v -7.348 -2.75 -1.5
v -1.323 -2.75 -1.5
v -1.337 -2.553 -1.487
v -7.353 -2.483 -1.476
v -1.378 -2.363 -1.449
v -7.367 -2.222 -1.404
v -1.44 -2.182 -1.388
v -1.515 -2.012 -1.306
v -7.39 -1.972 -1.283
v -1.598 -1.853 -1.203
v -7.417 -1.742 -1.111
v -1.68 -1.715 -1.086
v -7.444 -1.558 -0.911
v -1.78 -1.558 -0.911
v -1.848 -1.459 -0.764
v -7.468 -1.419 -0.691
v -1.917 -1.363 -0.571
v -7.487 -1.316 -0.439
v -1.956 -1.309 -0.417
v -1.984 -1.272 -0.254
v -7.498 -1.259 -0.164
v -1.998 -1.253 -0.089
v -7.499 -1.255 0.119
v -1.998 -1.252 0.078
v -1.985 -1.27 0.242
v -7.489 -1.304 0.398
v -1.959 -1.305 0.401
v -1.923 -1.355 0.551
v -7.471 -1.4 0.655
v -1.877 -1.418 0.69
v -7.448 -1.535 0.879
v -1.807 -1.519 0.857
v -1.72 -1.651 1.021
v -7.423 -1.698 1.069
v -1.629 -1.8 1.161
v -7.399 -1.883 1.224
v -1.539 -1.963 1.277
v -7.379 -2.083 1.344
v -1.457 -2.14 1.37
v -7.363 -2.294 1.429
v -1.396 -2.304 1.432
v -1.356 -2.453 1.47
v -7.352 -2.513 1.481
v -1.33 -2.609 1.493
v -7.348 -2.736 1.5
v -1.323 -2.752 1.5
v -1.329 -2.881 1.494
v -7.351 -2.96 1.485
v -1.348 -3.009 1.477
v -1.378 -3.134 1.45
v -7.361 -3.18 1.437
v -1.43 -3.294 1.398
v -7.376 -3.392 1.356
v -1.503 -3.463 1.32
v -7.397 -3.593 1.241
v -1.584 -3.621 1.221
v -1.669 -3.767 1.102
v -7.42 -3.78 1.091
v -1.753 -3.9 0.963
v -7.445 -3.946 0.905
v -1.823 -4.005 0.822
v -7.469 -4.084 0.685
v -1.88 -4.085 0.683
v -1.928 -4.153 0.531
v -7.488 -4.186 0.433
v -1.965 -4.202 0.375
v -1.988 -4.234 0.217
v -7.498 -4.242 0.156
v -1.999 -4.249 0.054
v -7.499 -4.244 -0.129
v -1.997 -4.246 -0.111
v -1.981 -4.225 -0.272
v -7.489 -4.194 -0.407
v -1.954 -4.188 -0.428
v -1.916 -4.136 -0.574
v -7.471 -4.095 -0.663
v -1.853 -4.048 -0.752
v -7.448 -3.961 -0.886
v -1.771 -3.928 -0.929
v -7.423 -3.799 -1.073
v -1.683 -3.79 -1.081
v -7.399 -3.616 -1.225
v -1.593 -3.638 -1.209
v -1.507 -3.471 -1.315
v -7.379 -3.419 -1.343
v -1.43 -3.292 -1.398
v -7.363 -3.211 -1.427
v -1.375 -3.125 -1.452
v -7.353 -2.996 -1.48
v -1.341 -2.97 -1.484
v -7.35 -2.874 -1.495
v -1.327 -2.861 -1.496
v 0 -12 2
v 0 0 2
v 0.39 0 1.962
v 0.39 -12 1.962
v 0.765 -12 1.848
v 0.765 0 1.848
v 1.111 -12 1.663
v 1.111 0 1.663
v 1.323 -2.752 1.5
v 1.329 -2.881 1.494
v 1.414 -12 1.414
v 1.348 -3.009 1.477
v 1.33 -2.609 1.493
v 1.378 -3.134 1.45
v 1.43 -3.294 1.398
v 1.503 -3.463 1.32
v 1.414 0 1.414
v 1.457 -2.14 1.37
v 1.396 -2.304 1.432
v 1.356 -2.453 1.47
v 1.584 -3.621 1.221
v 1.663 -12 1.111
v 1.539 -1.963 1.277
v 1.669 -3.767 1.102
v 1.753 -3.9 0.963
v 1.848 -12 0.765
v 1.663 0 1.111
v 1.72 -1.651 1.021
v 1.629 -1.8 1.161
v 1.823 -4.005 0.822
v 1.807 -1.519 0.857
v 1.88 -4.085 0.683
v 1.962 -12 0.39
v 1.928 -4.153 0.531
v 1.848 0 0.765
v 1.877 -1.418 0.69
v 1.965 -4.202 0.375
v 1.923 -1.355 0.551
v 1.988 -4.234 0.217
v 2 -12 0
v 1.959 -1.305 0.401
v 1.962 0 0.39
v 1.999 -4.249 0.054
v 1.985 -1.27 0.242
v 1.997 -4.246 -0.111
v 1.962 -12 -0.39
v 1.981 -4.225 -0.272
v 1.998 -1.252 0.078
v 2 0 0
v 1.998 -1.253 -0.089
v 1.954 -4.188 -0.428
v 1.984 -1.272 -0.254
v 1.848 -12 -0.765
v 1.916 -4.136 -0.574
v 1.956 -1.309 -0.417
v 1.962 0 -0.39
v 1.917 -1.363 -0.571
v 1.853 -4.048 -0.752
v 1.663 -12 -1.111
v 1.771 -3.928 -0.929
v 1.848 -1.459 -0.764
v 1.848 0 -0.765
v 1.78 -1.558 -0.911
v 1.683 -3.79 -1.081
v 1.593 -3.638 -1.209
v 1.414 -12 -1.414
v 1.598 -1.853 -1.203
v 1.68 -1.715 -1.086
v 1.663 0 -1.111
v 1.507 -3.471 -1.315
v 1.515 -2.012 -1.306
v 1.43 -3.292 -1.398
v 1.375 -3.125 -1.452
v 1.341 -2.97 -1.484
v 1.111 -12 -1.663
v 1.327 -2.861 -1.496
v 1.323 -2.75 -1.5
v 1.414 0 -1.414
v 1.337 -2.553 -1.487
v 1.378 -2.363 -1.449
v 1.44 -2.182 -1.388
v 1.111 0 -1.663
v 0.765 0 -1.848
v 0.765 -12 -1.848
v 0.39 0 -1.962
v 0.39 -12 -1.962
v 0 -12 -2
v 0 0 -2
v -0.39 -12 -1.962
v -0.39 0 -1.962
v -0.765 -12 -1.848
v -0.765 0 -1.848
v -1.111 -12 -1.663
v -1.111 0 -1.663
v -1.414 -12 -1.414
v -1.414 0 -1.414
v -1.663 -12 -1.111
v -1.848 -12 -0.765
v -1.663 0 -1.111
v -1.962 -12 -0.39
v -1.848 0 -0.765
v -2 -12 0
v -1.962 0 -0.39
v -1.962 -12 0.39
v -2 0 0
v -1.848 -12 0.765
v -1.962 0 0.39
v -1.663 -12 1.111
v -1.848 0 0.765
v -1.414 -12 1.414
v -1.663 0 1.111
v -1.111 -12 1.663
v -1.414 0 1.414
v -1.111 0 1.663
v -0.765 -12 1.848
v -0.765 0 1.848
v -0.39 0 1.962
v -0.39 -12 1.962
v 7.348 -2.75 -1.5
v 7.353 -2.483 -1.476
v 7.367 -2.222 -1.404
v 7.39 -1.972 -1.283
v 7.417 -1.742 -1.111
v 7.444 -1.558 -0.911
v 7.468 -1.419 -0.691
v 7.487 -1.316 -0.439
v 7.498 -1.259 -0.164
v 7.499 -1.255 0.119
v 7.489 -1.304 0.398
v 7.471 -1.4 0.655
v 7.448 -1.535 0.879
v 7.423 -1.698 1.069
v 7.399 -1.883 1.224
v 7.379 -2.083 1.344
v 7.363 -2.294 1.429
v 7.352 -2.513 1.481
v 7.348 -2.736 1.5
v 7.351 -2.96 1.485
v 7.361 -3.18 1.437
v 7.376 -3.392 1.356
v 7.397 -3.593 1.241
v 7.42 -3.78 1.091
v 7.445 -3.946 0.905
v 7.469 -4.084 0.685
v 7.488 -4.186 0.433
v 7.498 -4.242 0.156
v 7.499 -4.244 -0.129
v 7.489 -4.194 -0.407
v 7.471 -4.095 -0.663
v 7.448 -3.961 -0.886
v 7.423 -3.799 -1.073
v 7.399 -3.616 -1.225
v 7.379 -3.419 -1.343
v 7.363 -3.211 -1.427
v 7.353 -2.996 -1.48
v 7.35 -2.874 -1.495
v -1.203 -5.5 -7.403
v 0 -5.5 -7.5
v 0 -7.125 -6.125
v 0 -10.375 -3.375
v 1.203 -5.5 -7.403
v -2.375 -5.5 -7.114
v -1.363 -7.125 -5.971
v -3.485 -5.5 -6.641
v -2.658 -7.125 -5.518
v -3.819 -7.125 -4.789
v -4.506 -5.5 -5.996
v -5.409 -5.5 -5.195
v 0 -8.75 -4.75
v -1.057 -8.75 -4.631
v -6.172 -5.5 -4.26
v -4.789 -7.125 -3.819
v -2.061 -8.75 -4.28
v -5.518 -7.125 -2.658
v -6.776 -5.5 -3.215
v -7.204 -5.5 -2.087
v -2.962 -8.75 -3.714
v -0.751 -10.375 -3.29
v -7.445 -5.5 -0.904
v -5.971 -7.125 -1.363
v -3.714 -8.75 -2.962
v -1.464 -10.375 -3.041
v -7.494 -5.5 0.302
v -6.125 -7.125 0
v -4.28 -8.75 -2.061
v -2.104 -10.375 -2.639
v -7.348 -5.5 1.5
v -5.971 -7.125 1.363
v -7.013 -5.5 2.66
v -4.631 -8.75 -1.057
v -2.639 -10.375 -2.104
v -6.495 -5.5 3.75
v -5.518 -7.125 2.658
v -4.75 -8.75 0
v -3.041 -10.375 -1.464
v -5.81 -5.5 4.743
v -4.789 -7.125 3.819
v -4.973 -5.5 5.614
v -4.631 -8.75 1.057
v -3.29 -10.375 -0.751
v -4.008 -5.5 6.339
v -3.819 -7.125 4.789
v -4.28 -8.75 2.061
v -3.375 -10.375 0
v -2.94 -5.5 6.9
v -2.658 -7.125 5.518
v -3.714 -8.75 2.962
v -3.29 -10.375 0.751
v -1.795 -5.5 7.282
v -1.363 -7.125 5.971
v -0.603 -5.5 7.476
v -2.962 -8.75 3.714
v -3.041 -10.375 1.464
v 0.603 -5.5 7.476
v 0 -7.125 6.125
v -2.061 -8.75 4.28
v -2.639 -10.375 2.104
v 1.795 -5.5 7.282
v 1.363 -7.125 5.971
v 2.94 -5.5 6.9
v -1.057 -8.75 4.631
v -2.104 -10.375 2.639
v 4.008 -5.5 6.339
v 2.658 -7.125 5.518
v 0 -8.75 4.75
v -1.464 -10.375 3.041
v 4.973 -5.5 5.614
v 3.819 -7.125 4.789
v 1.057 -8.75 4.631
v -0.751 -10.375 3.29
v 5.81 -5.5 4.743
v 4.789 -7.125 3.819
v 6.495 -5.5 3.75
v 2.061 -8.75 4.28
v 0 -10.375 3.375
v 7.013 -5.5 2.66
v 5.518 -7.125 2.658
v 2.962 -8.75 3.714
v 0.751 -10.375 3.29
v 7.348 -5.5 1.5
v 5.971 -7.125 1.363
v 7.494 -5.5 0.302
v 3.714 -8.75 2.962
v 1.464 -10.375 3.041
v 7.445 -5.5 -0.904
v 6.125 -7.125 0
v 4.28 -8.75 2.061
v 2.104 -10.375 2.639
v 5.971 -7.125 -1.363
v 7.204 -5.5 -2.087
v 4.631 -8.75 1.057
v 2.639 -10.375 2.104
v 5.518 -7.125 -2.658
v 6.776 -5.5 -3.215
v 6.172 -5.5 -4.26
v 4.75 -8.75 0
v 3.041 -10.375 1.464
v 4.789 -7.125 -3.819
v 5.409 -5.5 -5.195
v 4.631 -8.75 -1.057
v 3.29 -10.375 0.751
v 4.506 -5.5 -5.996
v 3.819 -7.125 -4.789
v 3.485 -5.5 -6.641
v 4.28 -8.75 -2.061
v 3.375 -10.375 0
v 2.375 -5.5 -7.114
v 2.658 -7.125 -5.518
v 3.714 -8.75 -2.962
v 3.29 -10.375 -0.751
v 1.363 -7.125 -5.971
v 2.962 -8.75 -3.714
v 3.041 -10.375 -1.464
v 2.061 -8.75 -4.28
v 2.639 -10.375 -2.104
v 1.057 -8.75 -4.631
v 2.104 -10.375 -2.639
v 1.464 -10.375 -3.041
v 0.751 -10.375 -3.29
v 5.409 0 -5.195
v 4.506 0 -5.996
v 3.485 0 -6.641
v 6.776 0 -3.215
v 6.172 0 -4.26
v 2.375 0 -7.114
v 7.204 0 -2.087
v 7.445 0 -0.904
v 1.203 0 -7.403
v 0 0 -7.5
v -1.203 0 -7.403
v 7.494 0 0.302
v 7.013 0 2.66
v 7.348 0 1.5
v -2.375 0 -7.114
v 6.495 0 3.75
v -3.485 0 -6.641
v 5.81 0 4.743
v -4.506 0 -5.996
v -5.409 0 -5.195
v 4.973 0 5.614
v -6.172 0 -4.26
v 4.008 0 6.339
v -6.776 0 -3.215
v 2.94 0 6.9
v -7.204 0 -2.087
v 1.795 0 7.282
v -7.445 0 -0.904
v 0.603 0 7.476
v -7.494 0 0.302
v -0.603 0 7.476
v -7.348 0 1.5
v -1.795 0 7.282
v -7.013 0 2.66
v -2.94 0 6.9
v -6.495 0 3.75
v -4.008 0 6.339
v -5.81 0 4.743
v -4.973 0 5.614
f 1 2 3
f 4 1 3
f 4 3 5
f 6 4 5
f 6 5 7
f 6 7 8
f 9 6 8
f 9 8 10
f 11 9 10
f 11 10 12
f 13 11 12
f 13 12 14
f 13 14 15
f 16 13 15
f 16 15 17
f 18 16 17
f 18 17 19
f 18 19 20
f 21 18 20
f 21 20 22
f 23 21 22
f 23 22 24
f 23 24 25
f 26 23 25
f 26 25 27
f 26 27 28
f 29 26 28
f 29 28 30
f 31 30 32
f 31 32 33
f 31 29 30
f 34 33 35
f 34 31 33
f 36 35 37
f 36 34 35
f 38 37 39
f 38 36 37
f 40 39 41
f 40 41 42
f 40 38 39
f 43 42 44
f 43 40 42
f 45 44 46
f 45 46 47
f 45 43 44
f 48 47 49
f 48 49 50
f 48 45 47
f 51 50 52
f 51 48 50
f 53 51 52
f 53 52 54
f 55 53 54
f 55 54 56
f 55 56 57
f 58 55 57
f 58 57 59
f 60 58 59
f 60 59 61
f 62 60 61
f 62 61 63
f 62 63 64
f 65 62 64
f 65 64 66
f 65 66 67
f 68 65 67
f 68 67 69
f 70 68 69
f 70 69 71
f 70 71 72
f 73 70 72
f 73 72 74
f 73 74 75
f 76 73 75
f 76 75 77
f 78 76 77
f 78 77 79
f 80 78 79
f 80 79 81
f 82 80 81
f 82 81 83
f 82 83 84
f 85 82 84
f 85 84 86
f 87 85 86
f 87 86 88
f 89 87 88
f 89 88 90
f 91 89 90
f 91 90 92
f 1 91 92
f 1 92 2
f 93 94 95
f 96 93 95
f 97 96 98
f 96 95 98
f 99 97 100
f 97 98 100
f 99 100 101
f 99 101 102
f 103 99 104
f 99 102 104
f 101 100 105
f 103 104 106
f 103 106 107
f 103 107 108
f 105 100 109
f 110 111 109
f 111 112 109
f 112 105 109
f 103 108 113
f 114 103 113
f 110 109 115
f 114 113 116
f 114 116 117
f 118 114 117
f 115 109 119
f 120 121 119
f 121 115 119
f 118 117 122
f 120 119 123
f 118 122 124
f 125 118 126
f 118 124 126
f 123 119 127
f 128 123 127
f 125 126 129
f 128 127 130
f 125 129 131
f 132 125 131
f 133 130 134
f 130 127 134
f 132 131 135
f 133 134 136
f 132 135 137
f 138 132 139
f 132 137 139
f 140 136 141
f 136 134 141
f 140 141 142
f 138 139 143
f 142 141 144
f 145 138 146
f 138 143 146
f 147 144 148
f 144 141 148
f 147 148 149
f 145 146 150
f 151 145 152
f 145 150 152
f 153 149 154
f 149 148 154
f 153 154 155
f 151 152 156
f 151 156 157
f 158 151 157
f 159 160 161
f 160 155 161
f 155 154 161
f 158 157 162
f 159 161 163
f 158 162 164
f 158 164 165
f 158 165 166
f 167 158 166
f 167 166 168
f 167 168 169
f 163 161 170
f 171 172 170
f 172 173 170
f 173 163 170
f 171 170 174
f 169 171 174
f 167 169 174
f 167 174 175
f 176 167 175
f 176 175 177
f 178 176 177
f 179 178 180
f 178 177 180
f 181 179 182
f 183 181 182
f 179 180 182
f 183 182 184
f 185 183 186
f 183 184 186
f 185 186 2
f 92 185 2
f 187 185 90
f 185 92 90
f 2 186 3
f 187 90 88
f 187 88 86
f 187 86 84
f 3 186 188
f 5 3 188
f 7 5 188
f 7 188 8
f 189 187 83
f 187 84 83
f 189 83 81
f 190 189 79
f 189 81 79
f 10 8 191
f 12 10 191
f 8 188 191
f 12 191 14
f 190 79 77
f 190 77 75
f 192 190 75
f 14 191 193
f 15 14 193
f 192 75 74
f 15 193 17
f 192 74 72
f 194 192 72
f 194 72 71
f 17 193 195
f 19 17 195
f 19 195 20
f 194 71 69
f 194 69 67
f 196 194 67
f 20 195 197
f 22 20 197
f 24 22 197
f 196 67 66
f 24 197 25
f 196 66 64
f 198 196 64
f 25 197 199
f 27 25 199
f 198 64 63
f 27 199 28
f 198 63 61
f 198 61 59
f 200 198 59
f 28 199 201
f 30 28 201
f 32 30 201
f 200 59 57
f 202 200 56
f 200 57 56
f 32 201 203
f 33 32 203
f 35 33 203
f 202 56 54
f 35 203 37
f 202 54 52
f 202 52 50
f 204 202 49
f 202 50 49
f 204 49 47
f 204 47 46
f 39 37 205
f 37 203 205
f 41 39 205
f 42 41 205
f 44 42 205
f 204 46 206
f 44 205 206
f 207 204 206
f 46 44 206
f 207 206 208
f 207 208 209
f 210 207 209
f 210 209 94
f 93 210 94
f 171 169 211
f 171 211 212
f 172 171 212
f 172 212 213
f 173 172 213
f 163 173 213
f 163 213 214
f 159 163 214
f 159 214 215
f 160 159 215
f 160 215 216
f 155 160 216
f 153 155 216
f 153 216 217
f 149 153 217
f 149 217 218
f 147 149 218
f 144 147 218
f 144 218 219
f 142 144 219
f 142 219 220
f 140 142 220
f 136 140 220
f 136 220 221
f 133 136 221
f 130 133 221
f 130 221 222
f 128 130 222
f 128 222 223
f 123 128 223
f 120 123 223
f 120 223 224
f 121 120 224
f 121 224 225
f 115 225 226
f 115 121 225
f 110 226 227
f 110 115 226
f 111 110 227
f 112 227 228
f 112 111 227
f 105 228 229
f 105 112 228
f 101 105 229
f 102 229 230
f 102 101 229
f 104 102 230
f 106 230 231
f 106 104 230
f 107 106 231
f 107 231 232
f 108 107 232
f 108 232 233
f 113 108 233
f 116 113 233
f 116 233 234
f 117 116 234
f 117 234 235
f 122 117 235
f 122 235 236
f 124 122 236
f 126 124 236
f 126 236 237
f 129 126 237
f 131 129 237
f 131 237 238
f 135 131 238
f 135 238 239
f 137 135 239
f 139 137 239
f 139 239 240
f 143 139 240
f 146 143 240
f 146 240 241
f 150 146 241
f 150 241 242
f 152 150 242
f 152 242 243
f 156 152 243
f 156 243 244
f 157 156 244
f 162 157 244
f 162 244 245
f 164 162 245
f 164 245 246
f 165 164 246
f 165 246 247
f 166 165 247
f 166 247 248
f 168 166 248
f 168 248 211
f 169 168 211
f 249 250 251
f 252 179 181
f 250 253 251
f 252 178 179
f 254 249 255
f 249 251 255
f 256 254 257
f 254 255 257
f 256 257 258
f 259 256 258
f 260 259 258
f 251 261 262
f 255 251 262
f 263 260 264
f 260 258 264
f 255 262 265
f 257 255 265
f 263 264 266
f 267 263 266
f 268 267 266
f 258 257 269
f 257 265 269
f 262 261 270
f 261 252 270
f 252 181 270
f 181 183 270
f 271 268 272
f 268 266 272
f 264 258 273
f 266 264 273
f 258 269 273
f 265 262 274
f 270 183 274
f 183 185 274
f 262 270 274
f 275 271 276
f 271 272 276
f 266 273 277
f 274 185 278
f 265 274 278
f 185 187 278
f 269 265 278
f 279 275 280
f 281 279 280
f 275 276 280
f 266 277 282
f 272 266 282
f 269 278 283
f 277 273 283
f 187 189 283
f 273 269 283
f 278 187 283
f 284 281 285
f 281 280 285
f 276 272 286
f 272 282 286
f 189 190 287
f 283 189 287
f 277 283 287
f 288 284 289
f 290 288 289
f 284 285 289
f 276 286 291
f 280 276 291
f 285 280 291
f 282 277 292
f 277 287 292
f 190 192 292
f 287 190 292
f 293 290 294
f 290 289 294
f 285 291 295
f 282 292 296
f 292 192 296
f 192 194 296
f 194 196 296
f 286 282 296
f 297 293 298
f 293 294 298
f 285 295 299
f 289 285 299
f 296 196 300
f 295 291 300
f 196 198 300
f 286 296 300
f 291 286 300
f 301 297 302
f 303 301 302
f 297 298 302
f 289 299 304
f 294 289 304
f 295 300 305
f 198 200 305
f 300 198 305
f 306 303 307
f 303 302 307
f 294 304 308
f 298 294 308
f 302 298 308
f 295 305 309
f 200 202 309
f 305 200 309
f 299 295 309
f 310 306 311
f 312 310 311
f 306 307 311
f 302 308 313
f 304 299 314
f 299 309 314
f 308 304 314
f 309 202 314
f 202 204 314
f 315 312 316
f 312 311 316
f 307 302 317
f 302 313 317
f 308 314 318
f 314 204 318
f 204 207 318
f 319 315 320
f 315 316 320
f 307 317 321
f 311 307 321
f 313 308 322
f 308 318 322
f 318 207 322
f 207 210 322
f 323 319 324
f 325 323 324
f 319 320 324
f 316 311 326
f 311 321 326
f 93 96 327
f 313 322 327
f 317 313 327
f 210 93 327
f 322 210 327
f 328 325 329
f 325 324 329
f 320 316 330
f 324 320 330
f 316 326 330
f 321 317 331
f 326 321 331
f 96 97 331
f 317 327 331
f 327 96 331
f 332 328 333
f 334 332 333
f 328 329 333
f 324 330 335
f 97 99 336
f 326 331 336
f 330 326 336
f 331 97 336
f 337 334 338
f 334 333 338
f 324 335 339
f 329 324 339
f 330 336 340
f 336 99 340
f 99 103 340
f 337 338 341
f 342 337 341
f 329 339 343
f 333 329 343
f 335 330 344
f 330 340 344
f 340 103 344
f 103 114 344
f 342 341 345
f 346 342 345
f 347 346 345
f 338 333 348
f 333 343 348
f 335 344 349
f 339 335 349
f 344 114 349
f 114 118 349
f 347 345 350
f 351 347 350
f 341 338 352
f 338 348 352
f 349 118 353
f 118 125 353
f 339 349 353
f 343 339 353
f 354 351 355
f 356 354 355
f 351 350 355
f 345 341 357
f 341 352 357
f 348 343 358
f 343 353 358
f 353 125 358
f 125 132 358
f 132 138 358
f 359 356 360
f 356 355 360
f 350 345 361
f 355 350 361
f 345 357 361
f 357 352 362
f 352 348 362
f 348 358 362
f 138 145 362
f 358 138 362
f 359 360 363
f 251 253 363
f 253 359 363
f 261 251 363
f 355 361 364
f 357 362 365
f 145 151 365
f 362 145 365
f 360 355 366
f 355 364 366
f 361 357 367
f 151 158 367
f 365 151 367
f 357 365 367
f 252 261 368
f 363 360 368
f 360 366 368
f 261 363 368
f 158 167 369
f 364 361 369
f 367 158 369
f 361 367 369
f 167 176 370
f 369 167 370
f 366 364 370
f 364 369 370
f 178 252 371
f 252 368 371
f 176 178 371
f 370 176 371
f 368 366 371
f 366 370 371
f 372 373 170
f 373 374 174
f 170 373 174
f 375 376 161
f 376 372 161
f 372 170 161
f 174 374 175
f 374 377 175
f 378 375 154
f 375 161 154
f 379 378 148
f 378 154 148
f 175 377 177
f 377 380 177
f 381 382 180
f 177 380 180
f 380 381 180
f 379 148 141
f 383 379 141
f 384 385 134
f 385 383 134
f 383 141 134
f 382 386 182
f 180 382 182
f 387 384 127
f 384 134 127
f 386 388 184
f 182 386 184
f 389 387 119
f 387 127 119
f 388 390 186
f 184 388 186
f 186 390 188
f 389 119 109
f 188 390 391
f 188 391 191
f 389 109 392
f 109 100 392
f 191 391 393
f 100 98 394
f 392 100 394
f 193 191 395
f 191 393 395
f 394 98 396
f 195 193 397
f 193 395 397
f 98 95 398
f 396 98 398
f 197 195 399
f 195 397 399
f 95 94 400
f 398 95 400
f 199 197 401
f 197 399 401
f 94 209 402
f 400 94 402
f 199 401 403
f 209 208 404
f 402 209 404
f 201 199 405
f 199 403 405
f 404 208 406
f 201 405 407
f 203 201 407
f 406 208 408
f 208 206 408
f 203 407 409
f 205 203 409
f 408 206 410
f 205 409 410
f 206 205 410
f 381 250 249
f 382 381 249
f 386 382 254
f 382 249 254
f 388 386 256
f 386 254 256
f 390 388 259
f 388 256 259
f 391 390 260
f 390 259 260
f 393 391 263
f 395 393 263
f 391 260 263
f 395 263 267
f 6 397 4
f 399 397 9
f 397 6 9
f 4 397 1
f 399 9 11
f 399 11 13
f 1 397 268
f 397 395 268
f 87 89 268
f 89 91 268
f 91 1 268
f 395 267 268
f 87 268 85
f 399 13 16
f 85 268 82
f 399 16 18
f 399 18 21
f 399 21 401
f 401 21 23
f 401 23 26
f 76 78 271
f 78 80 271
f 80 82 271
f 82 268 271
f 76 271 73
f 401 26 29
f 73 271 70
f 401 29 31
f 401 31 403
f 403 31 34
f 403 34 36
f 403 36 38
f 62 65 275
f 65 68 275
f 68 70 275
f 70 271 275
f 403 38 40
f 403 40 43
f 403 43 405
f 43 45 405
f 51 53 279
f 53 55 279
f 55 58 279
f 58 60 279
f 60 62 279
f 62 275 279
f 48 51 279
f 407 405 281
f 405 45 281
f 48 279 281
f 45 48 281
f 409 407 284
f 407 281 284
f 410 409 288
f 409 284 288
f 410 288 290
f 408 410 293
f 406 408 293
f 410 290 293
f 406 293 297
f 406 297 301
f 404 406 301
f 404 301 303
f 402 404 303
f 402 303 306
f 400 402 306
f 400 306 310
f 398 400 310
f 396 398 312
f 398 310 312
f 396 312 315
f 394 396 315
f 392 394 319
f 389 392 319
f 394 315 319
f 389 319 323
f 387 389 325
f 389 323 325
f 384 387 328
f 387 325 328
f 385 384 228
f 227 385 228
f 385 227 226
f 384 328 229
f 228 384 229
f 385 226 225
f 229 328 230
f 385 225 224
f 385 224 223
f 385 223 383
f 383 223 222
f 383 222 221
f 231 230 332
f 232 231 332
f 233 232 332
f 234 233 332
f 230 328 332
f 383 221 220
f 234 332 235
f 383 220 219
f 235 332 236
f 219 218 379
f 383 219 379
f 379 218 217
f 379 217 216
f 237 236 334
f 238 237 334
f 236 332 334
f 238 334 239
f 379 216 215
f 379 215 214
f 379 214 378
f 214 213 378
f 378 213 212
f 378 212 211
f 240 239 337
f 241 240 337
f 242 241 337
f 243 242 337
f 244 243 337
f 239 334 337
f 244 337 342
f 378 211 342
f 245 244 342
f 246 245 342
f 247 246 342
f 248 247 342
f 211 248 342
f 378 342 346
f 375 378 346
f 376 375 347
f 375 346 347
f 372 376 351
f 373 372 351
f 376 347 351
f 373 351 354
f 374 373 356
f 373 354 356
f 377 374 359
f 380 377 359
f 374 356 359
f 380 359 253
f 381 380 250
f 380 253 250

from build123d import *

# Parameters (mm, degrees)
CUT_EXTRUDE1_DEPTH      = 17.015617378
CUT_EXTRUDE1_DEPTH_BACK = 17.015617378
SKETCH2_R               = 1.5
SKETCH3_R               = 2
CUT_EXTRUDE2_DEPTH      = 17.015617484


with BuildPart() as part:
    # Sketch1 → Revolve1 (revolve)
    with BuildSketch(Plane(origin=(0, 0, 0), x_dir=(0, 0, -1), z_dir=(1, 0, 0)), mode=Mode.PRIVATE) as revolve1_sk:
        Polygon((0, 0), (-7.5, 0), (-7.5, -5.5), (-2, -12), (0, -12), align=None)
    revolve(revolve1_sk.sketch.rotate(Axis((0, -12, 0), (0, 1, 0)), 180), axis=Axis((0, -12, 0), (0, 1, 0)))

    # Sketch2 → Cut-Extrude1 (cut, two sides: drawn at the far end of the back side and taken through both)
    with BuildSketch(Plane(origin=(0, 0, 0), x_dir=(0, 0, -1), z_dir=(1, 0, 0)).offset(-CUT_EXTRUDE1_DEPTH_BACK)):
        with Locations((0, -2.75)):
            Circle(SKETCH2_R)
    extrude(amount=CUT_EXTRUDE1_DEPTH + CUT_EXTRUDE1_DEPTH_BACK, mode=Mode.SUBTRACT)

    # Sketch3 → Cut-Extrude2 (cut, through all)
    with BuildSketch(Plane(origin=(0, 0, 0), x_dir=(1, 0, 0), z_dir=(0, 1, 0))):
        with Locations(Location((0, 0, 0), (0, 0, 270))):
            Circle(SKETCH3_R)
    extrude(amount=-CUT_EXTRUDE2_DEPTH, mode=Mode.SUBTRACT)


solid = part.part
